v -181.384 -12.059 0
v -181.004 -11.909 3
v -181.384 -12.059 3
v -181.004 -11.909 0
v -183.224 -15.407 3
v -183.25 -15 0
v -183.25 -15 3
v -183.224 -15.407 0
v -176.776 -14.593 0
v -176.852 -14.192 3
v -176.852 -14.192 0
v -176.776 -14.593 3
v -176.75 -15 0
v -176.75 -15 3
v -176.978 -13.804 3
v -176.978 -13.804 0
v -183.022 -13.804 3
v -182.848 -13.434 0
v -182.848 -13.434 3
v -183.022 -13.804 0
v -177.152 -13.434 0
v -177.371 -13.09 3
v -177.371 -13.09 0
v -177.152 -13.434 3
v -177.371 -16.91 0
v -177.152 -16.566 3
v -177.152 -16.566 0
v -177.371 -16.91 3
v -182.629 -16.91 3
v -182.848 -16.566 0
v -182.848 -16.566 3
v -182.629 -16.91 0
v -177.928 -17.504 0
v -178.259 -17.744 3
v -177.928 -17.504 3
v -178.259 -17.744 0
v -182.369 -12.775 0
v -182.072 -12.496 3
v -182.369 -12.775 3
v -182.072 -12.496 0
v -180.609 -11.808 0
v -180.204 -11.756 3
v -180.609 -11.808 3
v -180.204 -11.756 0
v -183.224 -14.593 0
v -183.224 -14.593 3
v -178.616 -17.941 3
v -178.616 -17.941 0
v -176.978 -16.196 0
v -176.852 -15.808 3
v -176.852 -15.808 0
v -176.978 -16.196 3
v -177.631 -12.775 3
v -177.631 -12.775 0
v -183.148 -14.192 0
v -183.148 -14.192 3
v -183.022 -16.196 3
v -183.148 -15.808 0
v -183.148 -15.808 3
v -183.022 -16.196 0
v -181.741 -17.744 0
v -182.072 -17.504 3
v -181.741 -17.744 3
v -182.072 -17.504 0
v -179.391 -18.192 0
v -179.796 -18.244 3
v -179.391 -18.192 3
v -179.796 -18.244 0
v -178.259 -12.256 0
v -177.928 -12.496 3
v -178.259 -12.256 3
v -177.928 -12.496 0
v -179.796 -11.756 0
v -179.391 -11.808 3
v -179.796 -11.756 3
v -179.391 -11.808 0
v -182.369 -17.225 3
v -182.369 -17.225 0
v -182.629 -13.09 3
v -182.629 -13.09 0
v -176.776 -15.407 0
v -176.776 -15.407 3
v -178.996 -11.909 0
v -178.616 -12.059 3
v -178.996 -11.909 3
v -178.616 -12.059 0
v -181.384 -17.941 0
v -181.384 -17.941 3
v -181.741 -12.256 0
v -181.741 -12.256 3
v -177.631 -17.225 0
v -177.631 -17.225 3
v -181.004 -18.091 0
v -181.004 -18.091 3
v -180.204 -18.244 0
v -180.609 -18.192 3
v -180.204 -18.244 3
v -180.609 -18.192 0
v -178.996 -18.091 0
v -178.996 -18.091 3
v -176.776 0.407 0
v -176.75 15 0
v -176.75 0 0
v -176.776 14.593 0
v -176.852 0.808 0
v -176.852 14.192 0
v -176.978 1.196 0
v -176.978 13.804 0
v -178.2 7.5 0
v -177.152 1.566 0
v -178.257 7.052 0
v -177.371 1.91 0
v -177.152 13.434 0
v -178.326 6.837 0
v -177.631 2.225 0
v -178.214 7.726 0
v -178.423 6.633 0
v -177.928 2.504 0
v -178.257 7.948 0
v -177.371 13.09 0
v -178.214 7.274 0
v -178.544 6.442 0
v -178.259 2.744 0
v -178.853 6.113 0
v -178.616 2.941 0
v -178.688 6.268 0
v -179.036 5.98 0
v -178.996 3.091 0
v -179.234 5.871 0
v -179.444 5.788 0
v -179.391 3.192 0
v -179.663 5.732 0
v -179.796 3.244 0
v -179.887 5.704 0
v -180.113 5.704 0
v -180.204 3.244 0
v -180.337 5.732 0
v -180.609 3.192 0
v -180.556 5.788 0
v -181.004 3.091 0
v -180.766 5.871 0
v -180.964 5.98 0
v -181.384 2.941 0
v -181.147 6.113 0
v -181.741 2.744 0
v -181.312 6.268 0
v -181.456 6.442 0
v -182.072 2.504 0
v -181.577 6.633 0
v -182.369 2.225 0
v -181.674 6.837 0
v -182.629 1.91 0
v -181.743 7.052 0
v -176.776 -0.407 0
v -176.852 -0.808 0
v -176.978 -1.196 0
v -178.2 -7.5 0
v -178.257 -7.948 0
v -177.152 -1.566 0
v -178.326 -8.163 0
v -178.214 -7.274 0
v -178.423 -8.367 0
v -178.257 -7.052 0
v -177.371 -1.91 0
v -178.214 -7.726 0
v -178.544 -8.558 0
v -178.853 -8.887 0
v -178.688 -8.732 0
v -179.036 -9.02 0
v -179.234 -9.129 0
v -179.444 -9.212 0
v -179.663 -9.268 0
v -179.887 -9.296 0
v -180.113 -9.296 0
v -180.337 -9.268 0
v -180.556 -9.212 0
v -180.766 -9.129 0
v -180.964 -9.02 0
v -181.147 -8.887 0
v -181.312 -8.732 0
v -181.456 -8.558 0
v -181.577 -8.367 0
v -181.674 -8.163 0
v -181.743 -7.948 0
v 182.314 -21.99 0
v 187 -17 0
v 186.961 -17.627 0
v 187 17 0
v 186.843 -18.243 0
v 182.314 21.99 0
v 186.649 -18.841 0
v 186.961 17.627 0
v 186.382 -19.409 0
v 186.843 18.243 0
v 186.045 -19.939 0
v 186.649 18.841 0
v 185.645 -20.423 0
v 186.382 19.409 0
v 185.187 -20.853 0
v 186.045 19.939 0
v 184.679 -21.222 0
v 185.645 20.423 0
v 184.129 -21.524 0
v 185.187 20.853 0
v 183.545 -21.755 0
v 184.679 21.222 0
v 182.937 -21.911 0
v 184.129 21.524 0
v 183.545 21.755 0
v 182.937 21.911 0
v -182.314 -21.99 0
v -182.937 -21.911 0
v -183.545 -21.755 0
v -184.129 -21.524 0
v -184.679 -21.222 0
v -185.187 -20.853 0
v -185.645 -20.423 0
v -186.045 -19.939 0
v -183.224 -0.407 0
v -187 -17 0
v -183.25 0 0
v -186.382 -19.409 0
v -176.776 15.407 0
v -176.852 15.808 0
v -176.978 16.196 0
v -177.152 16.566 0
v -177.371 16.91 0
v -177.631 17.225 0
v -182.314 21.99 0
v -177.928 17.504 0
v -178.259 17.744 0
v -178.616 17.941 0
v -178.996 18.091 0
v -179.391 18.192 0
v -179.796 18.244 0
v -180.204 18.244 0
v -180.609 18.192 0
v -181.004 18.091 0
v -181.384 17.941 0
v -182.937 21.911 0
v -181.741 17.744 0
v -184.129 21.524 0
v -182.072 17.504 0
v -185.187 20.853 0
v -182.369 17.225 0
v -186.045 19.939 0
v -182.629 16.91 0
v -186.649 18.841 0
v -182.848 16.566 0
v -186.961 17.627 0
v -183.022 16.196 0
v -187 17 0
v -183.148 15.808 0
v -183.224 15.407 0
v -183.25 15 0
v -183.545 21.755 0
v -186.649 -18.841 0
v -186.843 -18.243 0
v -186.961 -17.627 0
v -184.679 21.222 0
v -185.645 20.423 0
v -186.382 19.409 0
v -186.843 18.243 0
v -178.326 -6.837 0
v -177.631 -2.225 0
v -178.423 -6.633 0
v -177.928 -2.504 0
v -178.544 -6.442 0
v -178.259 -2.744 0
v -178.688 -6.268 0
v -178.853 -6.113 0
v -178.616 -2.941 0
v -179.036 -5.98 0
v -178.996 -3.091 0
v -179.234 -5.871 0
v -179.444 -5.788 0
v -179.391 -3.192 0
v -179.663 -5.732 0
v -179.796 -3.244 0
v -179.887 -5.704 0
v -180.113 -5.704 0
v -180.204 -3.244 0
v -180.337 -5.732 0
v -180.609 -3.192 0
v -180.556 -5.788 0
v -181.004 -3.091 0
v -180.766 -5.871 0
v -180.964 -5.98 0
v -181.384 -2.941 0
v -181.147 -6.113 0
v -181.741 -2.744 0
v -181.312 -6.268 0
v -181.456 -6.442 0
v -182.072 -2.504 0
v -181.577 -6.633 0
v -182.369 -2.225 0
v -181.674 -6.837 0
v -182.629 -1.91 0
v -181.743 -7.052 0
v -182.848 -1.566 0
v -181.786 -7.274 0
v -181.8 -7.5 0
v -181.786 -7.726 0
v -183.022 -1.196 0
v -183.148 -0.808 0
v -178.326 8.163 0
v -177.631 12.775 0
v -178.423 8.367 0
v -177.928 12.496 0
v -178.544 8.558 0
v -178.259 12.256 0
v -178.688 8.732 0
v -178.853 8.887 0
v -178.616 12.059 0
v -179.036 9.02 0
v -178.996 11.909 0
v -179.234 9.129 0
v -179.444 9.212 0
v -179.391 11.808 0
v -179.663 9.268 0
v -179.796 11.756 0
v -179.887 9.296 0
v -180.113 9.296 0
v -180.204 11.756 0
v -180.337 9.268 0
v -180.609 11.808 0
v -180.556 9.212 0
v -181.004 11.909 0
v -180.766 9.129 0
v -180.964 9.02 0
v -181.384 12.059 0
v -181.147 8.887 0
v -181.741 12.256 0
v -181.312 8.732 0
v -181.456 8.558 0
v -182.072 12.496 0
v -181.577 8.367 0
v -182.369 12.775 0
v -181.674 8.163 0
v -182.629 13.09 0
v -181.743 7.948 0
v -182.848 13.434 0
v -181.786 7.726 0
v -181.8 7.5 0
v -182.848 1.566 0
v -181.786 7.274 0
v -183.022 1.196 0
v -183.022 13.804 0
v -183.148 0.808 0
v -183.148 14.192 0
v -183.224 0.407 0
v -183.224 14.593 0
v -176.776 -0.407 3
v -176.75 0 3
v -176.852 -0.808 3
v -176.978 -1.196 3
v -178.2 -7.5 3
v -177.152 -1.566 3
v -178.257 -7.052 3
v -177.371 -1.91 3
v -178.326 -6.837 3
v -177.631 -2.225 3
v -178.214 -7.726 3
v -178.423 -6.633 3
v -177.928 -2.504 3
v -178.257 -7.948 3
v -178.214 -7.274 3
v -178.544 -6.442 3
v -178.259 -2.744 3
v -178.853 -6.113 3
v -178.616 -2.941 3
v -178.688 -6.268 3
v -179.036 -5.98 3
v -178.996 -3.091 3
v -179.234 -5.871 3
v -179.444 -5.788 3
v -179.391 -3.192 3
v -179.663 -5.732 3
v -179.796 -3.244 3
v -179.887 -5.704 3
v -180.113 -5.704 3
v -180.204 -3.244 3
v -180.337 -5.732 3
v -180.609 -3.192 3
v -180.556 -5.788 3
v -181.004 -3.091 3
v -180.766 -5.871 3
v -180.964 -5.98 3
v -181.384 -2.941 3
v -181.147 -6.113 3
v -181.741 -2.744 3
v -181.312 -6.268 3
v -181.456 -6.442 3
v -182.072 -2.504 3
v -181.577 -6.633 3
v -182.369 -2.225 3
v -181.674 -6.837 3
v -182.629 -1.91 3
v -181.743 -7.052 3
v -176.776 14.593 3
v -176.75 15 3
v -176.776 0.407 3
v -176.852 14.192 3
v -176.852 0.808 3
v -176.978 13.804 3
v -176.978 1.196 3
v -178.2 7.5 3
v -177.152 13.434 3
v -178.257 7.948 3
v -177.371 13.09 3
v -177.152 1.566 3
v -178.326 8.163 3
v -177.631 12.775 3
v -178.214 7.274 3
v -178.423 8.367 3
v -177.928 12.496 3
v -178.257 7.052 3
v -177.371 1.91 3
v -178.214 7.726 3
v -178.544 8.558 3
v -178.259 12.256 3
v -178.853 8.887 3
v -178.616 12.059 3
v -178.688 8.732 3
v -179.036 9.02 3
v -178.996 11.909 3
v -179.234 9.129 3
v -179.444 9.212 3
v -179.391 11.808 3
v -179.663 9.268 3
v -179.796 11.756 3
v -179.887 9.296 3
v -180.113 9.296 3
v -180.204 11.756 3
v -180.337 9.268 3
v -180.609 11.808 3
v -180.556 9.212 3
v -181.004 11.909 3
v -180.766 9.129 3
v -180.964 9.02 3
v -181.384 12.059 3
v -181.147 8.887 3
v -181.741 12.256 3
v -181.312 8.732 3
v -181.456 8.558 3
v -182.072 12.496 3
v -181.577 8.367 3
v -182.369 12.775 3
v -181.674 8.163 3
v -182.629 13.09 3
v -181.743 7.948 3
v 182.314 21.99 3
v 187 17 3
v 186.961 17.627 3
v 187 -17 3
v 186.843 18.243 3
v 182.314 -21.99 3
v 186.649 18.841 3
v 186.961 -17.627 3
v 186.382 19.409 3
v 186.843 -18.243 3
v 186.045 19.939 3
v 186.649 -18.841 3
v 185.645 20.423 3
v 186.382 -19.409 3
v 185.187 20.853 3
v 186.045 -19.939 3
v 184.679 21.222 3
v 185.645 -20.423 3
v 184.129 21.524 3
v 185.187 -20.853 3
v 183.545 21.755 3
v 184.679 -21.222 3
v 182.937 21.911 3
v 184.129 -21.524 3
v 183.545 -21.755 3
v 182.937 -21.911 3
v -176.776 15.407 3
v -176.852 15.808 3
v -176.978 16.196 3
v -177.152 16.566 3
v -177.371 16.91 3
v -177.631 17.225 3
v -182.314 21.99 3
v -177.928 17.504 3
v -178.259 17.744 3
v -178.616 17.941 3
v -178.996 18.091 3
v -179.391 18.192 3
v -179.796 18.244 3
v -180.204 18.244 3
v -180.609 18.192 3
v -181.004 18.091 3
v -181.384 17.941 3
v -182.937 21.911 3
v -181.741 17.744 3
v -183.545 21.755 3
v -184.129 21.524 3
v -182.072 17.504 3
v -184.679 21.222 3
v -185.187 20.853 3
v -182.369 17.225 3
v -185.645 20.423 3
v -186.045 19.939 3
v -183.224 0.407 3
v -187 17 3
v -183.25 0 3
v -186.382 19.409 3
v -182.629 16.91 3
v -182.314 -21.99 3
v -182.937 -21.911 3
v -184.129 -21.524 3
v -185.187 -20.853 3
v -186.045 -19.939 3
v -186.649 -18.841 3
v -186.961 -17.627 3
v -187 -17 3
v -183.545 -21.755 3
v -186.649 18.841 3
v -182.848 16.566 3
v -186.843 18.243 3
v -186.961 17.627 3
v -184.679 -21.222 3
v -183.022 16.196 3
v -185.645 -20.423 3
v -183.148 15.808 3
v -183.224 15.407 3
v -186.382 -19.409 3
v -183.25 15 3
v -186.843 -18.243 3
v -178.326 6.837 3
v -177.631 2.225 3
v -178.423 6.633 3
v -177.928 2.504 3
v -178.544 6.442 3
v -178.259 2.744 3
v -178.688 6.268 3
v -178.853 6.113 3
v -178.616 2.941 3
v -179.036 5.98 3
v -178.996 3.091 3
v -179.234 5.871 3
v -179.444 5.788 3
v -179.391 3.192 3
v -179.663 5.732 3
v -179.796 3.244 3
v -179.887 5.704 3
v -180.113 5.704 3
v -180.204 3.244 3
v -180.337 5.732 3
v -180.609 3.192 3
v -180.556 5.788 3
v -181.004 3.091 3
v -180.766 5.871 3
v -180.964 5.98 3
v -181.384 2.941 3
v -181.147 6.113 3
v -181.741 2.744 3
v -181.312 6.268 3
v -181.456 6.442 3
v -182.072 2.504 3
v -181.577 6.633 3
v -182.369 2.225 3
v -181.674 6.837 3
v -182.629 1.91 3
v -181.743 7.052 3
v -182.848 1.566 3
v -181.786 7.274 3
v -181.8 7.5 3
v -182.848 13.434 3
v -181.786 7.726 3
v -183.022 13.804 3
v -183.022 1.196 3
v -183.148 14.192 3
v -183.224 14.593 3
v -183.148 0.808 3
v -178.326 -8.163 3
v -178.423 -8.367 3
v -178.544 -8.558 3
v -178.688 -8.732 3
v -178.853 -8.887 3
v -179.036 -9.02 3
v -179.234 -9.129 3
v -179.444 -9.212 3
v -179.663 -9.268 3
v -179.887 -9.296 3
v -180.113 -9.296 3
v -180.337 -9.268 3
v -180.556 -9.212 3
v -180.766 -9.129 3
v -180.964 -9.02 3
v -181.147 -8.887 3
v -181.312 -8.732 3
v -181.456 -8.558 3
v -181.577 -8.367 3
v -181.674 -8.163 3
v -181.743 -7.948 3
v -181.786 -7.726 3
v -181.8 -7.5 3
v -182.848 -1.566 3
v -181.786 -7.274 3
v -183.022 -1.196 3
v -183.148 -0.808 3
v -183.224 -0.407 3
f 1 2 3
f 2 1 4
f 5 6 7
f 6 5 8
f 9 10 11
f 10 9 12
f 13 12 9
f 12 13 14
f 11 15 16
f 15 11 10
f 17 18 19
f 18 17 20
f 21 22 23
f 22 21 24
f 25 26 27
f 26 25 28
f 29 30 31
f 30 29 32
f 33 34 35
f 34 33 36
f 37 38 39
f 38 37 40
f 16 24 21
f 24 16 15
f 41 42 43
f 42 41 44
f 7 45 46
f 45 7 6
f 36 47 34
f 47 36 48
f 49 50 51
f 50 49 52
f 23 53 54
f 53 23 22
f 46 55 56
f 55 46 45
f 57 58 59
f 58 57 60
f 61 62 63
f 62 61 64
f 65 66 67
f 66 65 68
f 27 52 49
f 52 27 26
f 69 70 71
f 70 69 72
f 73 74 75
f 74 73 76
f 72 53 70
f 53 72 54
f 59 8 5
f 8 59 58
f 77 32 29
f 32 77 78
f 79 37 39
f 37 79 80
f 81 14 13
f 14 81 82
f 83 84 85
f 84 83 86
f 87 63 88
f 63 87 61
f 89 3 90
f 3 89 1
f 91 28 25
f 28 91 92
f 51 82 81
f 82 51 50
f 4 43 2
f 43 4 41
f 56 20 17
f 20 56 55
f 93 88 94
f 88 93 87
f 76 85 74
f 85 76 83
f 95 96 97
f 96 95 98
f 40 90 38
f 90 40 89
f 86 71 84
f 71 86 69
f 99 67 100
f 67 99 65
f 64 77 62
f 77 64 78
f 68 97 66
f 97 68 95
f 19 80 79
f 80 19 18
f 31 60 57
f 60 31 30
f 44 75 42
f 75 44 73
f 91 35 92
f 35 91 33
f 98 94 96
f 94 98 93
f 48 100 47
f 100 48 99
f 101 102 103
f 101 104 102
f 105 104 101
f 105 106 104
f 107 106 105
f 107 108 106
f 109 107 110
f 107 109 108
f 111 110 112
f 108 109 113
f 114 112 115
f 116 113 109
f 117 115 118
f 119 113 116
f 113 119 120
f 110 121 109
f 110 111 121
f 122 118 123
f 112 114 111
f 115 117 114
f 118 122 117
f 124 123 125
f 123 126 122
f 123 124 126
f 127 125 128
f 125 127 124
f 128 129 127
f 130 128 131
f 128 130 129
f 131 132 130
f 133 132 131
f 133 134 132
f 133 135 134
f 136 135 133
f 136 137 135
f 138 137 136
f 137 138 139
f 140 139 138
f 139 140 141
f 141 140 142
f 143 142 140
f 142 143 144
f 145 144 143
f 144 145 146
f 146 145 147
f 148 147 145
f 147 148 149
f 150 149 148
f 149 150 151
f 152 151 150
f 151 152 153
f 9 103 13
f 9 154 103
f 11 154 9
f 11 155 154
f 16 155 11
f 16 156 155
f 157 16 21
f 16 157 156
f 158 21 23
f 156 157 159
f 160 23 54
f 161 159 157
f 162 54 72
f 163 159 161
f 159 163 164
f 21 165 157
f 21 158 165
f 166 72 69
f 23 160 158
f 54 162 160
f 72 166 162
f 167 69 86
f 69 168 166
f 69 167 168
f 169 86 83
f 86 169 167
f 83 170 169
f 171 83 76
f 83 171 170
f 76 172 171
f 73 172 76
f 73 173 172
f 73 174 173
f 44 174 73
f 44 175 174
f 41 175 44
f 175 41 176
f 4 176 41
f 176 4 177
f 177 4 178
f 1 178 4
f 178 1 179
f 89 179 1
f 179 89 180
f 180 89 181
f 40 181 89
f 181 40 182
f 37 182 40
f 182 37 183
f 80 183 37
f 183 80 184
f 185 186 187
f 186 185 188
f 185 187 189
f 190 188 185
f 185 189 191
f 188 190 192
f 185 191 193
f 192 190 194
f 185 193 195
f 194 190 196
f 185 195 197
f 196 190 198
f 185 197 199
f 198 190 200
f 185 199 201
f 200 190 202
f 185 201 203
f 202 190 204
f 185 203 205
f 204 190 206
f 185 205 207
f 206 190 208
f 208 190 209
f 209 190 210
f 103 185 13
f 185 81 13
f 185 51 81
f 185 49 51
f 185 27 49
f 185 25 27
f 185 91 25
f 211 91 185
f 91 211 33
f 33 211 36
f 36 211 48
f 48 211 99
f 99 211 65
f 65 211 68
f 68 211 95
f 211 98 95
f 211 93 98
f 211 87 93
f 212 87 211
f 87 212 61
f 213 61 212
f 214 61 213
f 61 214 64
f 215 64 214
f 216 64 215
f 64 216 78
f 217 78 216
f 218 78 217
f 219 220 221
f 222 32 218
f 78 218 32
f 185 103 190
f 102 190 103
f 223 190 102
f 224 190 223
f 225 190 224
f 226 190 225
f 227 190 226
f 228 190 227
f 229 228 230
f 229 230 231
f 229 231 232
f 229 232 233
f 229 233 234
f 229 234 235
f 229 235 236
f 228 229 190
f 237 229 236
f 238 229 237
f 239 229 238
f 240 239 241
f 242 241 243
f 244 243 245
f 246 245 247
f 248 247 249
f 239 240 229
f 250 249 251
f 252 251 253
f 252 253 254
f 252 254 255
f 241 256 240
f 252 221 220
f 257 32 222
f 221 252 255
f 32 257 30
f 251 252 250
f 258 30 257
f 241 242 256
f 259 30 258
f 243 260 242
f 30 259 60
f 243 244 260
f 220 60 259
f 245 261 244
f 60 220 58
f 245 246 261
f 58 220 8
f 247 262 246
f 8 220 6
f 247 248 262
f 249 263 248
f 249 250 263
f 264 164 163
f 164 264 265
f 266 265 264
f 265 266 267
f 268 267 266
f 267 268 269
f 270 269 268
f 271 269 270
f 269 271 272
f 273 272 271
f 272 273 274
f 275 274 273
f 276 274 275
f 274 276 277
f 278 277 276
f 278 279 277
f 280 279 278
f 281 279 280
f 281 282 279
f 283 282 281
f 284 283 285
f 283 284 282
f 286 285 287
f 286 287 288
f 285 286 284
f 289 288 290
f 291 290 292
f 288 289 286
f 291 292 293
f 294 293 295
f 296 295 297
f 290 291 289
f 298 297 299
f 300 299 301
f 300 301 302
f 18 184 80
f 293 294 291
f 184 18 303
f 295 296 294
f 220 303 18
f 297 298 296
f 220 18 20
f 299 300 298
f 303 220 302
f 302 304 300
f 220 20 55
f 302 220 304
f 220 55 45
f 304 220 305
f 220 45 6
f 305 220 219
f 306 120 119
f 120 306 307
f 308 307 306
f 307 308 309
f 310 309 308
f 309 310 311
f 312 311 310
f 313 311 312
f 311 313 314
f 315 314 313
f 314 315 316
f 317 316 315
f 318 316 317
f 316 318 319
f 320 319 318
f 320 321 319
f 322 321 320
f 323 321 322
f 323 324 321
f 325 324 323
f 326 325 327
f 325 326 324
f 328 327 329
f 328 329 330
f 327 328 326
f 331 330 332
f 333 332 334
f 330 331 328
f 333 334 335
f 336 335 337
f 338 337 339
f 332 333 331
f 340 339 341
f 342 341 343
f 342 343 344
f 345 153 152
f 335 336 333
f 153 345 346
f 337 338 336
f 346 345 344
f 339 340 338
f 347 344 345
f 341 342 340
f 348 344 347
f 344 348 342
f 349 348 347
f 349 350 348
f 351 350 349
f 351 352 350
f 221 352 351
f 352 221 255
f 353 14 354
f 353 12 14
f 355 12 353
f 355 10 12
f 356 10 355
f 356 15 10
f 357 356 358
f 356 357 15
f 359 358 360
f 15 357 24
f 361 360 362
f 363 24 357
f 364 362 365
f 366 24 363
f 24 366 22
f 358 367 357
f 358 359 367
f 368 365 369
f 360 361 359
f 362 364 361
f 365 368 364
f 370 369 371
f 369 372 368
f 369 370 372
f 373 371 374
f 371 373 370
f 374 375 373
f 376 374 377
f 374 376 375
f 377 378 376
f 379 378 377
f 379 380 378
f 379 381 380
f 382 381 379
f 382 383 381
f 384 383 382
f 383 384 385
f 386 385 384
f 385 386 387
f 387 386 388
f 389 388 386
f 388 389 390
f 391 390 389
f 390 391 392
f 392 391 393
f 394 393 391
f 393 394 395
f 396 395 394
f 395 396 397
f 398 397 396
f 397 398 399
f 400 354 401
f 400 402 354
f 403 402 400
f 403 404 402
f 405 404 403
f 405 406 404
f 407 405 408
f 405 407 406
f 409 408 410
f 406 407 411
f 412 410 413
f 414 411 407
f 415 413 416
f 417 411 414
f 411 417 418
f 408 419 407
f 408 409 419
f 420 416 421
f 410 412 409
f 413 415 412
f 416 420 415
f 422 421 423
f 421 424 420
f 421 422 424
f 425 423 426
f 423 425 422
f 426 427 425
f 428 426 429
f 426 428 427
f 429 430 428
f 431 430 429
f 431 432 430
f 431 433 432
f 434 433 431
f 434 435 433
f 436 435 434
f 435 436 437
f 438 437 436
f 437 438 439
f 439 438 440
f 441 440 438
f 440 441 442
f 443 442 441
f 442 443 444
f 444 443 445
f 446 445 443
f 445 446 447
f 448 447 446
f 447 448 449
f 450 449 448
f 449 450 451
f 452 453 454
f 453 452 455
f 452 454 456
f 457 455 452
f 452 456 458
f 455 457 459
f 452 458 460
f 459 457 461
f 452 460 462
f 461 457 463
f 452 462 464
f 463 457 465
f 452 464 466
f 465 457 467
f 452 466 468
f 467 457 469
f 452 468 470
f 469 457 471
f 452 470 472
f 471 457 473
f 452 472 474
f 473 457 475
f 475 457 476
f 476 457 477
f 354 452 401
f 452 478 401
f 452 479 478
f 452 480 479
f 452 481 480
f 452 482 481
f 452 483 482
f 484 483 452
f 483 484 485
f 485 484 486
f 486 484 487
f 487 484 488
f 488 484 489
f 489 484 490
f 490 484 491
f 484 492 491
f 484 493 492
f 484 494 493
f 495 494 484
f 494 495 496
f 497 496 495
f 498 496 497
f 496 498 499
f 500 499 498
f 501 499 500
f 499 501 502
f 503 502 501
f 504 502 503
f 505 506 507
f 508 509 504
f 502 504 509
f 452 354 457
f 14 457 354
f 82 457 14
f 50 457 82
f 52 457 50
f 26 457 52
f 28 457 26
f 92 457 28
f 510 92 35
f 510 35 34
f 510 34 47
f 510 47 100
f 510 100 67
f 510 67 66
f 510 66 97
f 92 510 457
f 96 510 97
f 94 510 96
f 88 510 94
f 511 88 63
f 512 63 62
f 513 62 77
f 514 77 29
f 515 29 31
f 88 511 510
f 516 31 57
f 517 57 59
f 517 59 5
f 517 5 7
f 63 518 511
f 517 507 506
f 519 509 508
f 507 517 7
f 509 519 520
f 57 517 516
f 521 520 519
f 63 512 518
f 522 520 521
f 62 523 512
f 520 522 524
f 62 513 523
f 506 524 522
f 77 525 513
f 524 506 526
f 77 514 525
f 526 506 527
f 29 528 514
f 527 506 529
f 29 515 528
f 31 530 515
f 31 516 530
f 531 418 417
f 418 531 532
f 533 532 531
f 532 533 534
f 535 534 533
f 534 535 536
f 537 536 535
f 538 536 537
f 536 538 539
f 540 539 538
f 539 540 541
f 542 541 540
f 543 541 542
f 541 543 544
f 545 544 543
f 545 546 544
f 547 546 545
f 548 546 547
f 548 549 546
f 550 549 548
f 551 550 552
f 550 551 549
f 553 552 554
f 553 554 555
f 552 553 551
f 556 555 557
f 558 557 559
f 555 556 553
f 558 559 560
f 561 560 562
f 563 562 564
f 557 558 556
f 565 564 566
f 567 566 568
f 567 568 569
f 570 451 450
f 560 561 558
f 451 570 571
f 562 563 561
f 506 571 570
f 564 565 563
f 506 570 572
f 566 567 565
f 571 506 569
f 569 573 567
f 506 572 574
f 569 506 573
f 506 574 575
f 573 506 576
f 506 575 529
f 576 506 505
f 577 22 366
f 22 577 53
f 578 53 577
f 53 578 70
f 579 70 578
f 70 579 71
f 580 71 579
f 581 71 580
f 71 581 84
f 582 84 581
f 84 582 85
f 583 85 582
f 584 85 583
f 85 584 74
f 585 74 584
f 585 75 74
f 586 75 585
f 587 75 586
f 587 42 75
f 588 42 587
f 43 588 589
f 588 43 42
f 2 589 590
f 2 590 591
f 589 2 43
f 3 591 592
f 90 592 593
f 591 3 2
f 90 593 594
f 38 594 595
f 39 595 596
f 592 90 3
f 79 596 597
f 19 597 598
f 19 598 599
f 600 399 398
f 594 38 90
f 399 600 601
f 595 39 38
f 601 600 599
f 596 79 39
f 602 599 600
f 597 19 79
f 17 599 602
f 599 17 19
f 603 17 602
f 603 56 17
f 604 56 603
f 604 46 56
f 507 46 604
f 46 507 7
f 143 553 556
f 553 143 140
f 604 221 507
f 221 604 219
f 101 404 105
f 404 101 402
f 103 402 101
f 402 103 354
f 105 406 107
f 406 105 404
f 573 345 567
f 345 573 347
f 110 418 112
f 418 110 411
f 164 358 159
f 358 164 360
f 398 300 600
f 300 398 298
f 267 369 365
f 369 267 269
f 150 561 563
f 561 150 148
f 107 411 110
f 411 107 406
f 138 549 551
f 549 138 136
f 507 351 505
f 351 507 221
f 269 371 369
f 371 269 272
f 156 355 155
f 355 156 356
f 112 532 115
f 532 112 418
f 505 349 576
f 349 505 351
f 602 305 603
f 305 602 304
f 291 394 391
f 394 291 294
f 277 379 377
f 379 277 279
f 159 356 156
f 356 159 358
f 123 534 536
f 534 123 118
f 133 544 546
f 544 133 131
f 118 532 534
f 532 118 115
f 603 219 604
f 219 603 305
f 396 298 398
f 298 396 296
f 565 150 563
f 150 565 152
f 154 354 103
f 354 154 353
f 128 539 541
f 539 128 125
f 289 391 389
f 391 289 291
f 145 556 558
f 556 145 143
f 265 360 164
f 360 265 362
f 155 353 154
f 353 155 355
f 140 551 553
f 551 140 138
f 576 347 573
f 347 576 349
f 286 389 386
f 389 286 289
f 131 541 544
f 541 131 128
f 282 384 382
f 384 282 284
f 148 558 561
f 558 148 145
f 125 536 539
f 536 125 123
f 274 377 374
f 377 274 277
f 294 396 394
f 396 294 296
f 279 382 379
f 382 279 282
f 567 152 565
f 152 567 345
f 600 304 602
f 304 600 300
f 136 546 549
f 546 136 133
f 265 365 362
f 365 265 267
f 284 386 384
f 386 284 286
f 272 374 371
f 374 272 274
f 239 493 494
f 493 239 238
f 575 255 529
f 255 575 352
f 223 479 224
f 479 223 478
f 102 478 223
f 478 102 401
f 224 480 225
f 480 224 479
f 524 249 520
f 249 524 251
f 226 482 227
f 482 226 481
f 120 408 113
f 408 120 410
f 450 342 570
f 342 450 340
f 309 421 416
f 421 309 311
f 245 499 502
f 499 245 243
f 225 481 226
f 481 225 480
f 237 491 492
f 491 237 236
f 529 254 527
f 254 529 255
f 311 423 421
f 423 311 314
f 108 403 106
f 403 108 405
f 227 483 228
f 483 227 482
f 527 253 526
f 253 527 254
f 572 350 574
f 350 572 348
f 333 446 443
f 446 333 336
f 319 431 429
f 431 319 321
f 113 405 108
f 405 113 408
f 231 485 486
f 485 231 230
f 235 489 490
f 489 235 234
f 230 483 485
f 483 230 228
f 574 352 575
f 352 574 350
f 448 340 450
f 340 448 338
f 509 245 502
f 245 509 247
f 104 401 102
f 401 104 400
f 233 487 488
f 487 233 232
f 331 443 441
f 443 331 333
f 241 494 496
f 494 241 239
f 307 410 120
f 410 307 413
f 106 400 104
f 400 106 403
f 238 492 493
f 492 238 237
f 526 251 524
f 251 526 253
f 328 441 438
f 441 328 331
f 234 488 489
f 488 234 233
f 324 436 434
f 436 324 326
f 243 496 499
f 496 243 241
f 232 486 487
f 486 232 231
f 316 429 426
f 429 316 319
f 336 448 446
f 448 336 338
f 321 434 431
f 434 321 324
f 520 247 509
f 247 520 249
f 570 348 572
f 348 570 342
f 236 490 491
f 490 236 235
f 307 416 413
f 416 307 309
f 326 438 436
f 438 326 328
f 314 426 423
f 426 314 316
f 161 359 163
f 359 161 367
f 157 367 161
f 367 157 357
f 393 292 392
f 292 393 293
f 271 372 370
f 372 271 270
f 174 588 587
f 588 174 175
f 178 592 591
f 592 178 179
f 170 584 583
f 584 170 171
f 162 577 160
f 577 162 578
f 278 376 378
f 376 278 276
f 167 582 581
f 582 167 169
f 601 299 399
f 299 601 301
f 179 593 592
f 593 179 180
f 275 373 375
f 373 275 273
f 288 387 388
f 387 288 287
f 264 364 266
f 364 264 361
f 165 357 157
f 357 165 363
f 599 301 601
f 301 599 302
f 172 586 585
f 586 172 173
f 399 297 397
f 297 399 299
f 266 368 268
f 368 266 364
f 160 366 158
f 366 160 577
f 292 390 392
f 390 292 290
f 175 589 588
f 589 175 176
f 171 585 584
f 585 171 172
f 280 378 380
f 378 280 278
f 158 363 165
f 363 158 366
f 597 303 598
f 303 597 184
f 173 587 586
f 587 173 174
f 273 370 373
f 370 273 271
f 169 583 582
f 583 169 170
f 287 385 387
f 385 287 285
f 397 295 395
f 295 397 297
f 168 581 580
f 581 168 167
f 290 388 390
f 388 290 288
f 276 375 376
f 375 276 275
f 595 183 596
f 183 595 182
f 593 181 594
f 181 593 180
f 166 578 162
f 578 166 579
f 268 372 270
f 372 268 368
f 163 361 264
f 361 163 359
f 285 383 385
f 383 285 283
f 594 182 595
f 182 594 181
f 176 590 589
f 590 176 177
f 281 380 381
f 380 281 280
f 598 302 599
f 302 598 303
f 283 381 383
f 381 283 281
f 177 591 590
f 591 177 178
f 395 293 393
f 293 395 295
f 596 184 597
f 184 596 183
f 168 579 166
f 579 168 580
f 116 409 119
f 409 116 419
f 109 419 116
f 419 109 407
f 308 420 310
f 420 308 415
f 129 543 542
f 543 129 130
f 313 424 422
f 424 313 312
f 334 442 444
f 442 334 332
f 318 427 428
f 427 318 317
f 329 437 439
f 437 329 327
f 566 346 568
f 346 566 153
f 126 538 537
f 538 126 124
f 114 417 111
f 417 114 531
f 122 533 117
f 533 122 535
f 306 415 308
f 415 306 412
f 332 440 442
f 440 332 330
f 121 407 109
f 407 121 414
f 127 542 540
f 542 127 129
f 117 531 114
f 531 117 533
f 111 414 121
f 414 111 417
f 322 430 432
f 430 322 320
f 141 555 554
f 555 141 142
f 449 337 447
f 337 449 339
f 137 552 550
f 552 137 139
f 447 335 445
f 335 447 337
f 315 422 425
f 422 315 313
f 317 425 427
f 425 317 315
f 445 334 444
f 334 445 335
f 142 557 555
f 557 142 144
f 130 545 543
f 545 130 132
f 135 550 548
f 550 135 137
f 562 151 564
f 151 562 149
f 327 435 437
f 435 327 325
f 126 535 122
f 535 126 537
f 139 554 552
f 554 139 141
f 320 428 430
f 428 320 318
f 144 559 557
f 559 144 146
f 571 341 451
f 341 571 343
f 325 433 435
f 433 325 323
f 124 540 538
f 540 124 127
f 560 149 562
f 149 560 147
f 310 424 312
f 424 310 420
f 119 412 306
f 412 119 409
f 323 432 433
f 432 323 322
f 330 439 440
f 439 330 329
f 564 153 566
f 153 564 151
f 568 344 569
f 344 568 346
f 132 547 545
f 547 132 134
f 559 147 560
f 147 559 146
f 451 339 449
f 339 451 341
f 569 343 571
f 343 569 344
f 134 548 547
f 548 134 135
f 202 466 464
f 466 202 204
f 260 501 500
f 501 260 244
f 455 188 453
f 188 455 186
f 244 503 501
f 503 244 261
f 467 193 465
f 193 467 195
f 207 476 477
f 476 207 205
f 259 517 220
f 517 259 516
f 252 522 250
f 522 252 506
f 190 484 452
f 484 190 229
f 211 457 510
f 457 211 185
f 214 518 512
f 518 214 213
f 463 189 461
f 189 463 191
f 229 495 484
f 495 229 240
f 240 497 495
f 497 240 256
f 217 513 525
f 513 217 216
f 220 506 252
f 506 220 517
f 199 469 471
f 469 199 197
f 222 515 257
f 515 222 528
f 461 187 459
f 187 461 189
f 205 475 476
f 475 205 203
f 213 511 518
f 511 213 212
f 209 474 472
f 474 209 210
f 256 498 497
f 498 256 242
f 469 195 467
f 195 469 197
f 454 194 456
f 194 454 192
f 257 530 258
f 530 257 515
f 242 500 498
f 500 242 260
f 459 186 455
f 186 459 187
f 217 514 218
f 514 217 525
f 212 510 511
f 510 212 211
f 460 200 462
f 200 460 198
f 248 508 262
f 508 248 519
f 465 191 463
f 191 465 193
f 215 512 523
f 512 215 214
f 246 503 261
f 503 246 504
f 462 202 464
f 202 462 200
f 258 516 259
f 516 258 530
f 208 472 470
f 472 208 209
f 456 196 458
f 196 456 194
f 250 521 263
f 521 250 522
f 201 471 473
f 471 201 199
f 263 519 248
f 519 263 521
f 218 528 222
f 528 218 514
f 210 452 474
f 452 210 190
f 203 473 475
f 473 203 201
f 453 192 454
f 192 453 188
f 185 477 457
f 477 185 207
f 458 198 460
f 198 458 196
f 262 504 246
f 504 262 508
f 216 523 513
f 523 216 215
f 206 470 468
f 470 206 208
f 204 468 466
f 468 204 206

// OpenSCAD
$fn = 50;


difference() {
	union() {
		hull() {
			translate(v = [-182.0000000000, 17.0000000000, 0]) {
				cylinder(h = 3, r = 5);
			}
			translate(v = [182.0000000000, 17.0000000000, 0]) {
				cylinder(h = 3, r = 5);
			}
			translate(v = [-182.0000000000, -17.0000000000, 0]) {
				cylinder(h = 3, r = 5);
			}
			translate(v = [182.0000000000, -17.0000000000, 0]) {
				cylinder(h = 3, r = 5);
			}
		}
	}
	union() {
		translate(v = [-180.0000000000, -15.0000000000, 0]) {
			cylinder(h = 3, r = 3.2500000000);
		}
		translate(v = [-180.0000000000, 0.0000000000, 0]) {
			cylinder(h = 3, r = 3.2500000000);
		}
		translate(v = [-180.0000000000, 15.0000000000, 0]) {
			cylinder(h = 3, r = 3.2500000000);
		}
		translate(v = [-180.0000000000, -15.0000000000, 0]) {
			cylinder(h = 3, r = 1.8000000000);
		}
		translate(v = [-180.0000000000, -7.5000000000, 0]) {
			cylinder(h = 3, r = 1.8000000000);
		}
		translate(v = [-180.0000000000, 0.0000000000, 0]) {
			cylinder(h = 3, r = 1.8000000000);
		}
		translate(v = [-180.0000000000, 7.5000000000, 0]) {
			cylinder(h = 3, r = 1.8000000000);
		}
		translate(v = [-180.0000000000, 15.0000000000, 0]) {
			cylinder(h = 3, r = 1.8000000000);
		}
		translate(v = [-180.0000000000, -15.0000000000, 0]) {
			cylinder(h = 3, r = 1.8000000000);
		}
		translate(v = [-180.0000000000, -7.5000000000, 0]) {
			cylinder(h = 3, r = 1.8000000000);
		}
		translate(v = [-180.0000000000, 0.0000000000, 0]) {
			cylinder(h = 3, r = 1.8000000000);
		}
		translate(v = [-180.0000000000, 7.5000000000, 0]) {
			cylinder(h = 3, r = 1.8000000000);
		}
		translate(v = [-180.0000000000, 15.0000000000, 0]) {
			cylinder(h = 3, r = 1.8000000000);
		}
		translate(v = [-180.0000000000, -15.0000000000, 0]) {
			cylinder(h = 3, r = 1.8000000000);
		}
		translate(v = [-180.0000000000, -7.5000000000, 0]) {
			cylinder(h = 3, r = 1.8000000000);
		}
		translate(v = [-180.0000000000, 0.0000000000, 0]) {
			cylinder(h = 3, r = 1.8000000000);
		}
		translate(v = [-180.0000000000, 7.5000000000, 0]) {
			cylinder(h = 3, r = 1.8000000000);
		}
		translate(v = [-180.0000000000, 15.0000000000, 0]) {
			cylinder(h = 3, r = 1.8000000000);
		}
	}
}
